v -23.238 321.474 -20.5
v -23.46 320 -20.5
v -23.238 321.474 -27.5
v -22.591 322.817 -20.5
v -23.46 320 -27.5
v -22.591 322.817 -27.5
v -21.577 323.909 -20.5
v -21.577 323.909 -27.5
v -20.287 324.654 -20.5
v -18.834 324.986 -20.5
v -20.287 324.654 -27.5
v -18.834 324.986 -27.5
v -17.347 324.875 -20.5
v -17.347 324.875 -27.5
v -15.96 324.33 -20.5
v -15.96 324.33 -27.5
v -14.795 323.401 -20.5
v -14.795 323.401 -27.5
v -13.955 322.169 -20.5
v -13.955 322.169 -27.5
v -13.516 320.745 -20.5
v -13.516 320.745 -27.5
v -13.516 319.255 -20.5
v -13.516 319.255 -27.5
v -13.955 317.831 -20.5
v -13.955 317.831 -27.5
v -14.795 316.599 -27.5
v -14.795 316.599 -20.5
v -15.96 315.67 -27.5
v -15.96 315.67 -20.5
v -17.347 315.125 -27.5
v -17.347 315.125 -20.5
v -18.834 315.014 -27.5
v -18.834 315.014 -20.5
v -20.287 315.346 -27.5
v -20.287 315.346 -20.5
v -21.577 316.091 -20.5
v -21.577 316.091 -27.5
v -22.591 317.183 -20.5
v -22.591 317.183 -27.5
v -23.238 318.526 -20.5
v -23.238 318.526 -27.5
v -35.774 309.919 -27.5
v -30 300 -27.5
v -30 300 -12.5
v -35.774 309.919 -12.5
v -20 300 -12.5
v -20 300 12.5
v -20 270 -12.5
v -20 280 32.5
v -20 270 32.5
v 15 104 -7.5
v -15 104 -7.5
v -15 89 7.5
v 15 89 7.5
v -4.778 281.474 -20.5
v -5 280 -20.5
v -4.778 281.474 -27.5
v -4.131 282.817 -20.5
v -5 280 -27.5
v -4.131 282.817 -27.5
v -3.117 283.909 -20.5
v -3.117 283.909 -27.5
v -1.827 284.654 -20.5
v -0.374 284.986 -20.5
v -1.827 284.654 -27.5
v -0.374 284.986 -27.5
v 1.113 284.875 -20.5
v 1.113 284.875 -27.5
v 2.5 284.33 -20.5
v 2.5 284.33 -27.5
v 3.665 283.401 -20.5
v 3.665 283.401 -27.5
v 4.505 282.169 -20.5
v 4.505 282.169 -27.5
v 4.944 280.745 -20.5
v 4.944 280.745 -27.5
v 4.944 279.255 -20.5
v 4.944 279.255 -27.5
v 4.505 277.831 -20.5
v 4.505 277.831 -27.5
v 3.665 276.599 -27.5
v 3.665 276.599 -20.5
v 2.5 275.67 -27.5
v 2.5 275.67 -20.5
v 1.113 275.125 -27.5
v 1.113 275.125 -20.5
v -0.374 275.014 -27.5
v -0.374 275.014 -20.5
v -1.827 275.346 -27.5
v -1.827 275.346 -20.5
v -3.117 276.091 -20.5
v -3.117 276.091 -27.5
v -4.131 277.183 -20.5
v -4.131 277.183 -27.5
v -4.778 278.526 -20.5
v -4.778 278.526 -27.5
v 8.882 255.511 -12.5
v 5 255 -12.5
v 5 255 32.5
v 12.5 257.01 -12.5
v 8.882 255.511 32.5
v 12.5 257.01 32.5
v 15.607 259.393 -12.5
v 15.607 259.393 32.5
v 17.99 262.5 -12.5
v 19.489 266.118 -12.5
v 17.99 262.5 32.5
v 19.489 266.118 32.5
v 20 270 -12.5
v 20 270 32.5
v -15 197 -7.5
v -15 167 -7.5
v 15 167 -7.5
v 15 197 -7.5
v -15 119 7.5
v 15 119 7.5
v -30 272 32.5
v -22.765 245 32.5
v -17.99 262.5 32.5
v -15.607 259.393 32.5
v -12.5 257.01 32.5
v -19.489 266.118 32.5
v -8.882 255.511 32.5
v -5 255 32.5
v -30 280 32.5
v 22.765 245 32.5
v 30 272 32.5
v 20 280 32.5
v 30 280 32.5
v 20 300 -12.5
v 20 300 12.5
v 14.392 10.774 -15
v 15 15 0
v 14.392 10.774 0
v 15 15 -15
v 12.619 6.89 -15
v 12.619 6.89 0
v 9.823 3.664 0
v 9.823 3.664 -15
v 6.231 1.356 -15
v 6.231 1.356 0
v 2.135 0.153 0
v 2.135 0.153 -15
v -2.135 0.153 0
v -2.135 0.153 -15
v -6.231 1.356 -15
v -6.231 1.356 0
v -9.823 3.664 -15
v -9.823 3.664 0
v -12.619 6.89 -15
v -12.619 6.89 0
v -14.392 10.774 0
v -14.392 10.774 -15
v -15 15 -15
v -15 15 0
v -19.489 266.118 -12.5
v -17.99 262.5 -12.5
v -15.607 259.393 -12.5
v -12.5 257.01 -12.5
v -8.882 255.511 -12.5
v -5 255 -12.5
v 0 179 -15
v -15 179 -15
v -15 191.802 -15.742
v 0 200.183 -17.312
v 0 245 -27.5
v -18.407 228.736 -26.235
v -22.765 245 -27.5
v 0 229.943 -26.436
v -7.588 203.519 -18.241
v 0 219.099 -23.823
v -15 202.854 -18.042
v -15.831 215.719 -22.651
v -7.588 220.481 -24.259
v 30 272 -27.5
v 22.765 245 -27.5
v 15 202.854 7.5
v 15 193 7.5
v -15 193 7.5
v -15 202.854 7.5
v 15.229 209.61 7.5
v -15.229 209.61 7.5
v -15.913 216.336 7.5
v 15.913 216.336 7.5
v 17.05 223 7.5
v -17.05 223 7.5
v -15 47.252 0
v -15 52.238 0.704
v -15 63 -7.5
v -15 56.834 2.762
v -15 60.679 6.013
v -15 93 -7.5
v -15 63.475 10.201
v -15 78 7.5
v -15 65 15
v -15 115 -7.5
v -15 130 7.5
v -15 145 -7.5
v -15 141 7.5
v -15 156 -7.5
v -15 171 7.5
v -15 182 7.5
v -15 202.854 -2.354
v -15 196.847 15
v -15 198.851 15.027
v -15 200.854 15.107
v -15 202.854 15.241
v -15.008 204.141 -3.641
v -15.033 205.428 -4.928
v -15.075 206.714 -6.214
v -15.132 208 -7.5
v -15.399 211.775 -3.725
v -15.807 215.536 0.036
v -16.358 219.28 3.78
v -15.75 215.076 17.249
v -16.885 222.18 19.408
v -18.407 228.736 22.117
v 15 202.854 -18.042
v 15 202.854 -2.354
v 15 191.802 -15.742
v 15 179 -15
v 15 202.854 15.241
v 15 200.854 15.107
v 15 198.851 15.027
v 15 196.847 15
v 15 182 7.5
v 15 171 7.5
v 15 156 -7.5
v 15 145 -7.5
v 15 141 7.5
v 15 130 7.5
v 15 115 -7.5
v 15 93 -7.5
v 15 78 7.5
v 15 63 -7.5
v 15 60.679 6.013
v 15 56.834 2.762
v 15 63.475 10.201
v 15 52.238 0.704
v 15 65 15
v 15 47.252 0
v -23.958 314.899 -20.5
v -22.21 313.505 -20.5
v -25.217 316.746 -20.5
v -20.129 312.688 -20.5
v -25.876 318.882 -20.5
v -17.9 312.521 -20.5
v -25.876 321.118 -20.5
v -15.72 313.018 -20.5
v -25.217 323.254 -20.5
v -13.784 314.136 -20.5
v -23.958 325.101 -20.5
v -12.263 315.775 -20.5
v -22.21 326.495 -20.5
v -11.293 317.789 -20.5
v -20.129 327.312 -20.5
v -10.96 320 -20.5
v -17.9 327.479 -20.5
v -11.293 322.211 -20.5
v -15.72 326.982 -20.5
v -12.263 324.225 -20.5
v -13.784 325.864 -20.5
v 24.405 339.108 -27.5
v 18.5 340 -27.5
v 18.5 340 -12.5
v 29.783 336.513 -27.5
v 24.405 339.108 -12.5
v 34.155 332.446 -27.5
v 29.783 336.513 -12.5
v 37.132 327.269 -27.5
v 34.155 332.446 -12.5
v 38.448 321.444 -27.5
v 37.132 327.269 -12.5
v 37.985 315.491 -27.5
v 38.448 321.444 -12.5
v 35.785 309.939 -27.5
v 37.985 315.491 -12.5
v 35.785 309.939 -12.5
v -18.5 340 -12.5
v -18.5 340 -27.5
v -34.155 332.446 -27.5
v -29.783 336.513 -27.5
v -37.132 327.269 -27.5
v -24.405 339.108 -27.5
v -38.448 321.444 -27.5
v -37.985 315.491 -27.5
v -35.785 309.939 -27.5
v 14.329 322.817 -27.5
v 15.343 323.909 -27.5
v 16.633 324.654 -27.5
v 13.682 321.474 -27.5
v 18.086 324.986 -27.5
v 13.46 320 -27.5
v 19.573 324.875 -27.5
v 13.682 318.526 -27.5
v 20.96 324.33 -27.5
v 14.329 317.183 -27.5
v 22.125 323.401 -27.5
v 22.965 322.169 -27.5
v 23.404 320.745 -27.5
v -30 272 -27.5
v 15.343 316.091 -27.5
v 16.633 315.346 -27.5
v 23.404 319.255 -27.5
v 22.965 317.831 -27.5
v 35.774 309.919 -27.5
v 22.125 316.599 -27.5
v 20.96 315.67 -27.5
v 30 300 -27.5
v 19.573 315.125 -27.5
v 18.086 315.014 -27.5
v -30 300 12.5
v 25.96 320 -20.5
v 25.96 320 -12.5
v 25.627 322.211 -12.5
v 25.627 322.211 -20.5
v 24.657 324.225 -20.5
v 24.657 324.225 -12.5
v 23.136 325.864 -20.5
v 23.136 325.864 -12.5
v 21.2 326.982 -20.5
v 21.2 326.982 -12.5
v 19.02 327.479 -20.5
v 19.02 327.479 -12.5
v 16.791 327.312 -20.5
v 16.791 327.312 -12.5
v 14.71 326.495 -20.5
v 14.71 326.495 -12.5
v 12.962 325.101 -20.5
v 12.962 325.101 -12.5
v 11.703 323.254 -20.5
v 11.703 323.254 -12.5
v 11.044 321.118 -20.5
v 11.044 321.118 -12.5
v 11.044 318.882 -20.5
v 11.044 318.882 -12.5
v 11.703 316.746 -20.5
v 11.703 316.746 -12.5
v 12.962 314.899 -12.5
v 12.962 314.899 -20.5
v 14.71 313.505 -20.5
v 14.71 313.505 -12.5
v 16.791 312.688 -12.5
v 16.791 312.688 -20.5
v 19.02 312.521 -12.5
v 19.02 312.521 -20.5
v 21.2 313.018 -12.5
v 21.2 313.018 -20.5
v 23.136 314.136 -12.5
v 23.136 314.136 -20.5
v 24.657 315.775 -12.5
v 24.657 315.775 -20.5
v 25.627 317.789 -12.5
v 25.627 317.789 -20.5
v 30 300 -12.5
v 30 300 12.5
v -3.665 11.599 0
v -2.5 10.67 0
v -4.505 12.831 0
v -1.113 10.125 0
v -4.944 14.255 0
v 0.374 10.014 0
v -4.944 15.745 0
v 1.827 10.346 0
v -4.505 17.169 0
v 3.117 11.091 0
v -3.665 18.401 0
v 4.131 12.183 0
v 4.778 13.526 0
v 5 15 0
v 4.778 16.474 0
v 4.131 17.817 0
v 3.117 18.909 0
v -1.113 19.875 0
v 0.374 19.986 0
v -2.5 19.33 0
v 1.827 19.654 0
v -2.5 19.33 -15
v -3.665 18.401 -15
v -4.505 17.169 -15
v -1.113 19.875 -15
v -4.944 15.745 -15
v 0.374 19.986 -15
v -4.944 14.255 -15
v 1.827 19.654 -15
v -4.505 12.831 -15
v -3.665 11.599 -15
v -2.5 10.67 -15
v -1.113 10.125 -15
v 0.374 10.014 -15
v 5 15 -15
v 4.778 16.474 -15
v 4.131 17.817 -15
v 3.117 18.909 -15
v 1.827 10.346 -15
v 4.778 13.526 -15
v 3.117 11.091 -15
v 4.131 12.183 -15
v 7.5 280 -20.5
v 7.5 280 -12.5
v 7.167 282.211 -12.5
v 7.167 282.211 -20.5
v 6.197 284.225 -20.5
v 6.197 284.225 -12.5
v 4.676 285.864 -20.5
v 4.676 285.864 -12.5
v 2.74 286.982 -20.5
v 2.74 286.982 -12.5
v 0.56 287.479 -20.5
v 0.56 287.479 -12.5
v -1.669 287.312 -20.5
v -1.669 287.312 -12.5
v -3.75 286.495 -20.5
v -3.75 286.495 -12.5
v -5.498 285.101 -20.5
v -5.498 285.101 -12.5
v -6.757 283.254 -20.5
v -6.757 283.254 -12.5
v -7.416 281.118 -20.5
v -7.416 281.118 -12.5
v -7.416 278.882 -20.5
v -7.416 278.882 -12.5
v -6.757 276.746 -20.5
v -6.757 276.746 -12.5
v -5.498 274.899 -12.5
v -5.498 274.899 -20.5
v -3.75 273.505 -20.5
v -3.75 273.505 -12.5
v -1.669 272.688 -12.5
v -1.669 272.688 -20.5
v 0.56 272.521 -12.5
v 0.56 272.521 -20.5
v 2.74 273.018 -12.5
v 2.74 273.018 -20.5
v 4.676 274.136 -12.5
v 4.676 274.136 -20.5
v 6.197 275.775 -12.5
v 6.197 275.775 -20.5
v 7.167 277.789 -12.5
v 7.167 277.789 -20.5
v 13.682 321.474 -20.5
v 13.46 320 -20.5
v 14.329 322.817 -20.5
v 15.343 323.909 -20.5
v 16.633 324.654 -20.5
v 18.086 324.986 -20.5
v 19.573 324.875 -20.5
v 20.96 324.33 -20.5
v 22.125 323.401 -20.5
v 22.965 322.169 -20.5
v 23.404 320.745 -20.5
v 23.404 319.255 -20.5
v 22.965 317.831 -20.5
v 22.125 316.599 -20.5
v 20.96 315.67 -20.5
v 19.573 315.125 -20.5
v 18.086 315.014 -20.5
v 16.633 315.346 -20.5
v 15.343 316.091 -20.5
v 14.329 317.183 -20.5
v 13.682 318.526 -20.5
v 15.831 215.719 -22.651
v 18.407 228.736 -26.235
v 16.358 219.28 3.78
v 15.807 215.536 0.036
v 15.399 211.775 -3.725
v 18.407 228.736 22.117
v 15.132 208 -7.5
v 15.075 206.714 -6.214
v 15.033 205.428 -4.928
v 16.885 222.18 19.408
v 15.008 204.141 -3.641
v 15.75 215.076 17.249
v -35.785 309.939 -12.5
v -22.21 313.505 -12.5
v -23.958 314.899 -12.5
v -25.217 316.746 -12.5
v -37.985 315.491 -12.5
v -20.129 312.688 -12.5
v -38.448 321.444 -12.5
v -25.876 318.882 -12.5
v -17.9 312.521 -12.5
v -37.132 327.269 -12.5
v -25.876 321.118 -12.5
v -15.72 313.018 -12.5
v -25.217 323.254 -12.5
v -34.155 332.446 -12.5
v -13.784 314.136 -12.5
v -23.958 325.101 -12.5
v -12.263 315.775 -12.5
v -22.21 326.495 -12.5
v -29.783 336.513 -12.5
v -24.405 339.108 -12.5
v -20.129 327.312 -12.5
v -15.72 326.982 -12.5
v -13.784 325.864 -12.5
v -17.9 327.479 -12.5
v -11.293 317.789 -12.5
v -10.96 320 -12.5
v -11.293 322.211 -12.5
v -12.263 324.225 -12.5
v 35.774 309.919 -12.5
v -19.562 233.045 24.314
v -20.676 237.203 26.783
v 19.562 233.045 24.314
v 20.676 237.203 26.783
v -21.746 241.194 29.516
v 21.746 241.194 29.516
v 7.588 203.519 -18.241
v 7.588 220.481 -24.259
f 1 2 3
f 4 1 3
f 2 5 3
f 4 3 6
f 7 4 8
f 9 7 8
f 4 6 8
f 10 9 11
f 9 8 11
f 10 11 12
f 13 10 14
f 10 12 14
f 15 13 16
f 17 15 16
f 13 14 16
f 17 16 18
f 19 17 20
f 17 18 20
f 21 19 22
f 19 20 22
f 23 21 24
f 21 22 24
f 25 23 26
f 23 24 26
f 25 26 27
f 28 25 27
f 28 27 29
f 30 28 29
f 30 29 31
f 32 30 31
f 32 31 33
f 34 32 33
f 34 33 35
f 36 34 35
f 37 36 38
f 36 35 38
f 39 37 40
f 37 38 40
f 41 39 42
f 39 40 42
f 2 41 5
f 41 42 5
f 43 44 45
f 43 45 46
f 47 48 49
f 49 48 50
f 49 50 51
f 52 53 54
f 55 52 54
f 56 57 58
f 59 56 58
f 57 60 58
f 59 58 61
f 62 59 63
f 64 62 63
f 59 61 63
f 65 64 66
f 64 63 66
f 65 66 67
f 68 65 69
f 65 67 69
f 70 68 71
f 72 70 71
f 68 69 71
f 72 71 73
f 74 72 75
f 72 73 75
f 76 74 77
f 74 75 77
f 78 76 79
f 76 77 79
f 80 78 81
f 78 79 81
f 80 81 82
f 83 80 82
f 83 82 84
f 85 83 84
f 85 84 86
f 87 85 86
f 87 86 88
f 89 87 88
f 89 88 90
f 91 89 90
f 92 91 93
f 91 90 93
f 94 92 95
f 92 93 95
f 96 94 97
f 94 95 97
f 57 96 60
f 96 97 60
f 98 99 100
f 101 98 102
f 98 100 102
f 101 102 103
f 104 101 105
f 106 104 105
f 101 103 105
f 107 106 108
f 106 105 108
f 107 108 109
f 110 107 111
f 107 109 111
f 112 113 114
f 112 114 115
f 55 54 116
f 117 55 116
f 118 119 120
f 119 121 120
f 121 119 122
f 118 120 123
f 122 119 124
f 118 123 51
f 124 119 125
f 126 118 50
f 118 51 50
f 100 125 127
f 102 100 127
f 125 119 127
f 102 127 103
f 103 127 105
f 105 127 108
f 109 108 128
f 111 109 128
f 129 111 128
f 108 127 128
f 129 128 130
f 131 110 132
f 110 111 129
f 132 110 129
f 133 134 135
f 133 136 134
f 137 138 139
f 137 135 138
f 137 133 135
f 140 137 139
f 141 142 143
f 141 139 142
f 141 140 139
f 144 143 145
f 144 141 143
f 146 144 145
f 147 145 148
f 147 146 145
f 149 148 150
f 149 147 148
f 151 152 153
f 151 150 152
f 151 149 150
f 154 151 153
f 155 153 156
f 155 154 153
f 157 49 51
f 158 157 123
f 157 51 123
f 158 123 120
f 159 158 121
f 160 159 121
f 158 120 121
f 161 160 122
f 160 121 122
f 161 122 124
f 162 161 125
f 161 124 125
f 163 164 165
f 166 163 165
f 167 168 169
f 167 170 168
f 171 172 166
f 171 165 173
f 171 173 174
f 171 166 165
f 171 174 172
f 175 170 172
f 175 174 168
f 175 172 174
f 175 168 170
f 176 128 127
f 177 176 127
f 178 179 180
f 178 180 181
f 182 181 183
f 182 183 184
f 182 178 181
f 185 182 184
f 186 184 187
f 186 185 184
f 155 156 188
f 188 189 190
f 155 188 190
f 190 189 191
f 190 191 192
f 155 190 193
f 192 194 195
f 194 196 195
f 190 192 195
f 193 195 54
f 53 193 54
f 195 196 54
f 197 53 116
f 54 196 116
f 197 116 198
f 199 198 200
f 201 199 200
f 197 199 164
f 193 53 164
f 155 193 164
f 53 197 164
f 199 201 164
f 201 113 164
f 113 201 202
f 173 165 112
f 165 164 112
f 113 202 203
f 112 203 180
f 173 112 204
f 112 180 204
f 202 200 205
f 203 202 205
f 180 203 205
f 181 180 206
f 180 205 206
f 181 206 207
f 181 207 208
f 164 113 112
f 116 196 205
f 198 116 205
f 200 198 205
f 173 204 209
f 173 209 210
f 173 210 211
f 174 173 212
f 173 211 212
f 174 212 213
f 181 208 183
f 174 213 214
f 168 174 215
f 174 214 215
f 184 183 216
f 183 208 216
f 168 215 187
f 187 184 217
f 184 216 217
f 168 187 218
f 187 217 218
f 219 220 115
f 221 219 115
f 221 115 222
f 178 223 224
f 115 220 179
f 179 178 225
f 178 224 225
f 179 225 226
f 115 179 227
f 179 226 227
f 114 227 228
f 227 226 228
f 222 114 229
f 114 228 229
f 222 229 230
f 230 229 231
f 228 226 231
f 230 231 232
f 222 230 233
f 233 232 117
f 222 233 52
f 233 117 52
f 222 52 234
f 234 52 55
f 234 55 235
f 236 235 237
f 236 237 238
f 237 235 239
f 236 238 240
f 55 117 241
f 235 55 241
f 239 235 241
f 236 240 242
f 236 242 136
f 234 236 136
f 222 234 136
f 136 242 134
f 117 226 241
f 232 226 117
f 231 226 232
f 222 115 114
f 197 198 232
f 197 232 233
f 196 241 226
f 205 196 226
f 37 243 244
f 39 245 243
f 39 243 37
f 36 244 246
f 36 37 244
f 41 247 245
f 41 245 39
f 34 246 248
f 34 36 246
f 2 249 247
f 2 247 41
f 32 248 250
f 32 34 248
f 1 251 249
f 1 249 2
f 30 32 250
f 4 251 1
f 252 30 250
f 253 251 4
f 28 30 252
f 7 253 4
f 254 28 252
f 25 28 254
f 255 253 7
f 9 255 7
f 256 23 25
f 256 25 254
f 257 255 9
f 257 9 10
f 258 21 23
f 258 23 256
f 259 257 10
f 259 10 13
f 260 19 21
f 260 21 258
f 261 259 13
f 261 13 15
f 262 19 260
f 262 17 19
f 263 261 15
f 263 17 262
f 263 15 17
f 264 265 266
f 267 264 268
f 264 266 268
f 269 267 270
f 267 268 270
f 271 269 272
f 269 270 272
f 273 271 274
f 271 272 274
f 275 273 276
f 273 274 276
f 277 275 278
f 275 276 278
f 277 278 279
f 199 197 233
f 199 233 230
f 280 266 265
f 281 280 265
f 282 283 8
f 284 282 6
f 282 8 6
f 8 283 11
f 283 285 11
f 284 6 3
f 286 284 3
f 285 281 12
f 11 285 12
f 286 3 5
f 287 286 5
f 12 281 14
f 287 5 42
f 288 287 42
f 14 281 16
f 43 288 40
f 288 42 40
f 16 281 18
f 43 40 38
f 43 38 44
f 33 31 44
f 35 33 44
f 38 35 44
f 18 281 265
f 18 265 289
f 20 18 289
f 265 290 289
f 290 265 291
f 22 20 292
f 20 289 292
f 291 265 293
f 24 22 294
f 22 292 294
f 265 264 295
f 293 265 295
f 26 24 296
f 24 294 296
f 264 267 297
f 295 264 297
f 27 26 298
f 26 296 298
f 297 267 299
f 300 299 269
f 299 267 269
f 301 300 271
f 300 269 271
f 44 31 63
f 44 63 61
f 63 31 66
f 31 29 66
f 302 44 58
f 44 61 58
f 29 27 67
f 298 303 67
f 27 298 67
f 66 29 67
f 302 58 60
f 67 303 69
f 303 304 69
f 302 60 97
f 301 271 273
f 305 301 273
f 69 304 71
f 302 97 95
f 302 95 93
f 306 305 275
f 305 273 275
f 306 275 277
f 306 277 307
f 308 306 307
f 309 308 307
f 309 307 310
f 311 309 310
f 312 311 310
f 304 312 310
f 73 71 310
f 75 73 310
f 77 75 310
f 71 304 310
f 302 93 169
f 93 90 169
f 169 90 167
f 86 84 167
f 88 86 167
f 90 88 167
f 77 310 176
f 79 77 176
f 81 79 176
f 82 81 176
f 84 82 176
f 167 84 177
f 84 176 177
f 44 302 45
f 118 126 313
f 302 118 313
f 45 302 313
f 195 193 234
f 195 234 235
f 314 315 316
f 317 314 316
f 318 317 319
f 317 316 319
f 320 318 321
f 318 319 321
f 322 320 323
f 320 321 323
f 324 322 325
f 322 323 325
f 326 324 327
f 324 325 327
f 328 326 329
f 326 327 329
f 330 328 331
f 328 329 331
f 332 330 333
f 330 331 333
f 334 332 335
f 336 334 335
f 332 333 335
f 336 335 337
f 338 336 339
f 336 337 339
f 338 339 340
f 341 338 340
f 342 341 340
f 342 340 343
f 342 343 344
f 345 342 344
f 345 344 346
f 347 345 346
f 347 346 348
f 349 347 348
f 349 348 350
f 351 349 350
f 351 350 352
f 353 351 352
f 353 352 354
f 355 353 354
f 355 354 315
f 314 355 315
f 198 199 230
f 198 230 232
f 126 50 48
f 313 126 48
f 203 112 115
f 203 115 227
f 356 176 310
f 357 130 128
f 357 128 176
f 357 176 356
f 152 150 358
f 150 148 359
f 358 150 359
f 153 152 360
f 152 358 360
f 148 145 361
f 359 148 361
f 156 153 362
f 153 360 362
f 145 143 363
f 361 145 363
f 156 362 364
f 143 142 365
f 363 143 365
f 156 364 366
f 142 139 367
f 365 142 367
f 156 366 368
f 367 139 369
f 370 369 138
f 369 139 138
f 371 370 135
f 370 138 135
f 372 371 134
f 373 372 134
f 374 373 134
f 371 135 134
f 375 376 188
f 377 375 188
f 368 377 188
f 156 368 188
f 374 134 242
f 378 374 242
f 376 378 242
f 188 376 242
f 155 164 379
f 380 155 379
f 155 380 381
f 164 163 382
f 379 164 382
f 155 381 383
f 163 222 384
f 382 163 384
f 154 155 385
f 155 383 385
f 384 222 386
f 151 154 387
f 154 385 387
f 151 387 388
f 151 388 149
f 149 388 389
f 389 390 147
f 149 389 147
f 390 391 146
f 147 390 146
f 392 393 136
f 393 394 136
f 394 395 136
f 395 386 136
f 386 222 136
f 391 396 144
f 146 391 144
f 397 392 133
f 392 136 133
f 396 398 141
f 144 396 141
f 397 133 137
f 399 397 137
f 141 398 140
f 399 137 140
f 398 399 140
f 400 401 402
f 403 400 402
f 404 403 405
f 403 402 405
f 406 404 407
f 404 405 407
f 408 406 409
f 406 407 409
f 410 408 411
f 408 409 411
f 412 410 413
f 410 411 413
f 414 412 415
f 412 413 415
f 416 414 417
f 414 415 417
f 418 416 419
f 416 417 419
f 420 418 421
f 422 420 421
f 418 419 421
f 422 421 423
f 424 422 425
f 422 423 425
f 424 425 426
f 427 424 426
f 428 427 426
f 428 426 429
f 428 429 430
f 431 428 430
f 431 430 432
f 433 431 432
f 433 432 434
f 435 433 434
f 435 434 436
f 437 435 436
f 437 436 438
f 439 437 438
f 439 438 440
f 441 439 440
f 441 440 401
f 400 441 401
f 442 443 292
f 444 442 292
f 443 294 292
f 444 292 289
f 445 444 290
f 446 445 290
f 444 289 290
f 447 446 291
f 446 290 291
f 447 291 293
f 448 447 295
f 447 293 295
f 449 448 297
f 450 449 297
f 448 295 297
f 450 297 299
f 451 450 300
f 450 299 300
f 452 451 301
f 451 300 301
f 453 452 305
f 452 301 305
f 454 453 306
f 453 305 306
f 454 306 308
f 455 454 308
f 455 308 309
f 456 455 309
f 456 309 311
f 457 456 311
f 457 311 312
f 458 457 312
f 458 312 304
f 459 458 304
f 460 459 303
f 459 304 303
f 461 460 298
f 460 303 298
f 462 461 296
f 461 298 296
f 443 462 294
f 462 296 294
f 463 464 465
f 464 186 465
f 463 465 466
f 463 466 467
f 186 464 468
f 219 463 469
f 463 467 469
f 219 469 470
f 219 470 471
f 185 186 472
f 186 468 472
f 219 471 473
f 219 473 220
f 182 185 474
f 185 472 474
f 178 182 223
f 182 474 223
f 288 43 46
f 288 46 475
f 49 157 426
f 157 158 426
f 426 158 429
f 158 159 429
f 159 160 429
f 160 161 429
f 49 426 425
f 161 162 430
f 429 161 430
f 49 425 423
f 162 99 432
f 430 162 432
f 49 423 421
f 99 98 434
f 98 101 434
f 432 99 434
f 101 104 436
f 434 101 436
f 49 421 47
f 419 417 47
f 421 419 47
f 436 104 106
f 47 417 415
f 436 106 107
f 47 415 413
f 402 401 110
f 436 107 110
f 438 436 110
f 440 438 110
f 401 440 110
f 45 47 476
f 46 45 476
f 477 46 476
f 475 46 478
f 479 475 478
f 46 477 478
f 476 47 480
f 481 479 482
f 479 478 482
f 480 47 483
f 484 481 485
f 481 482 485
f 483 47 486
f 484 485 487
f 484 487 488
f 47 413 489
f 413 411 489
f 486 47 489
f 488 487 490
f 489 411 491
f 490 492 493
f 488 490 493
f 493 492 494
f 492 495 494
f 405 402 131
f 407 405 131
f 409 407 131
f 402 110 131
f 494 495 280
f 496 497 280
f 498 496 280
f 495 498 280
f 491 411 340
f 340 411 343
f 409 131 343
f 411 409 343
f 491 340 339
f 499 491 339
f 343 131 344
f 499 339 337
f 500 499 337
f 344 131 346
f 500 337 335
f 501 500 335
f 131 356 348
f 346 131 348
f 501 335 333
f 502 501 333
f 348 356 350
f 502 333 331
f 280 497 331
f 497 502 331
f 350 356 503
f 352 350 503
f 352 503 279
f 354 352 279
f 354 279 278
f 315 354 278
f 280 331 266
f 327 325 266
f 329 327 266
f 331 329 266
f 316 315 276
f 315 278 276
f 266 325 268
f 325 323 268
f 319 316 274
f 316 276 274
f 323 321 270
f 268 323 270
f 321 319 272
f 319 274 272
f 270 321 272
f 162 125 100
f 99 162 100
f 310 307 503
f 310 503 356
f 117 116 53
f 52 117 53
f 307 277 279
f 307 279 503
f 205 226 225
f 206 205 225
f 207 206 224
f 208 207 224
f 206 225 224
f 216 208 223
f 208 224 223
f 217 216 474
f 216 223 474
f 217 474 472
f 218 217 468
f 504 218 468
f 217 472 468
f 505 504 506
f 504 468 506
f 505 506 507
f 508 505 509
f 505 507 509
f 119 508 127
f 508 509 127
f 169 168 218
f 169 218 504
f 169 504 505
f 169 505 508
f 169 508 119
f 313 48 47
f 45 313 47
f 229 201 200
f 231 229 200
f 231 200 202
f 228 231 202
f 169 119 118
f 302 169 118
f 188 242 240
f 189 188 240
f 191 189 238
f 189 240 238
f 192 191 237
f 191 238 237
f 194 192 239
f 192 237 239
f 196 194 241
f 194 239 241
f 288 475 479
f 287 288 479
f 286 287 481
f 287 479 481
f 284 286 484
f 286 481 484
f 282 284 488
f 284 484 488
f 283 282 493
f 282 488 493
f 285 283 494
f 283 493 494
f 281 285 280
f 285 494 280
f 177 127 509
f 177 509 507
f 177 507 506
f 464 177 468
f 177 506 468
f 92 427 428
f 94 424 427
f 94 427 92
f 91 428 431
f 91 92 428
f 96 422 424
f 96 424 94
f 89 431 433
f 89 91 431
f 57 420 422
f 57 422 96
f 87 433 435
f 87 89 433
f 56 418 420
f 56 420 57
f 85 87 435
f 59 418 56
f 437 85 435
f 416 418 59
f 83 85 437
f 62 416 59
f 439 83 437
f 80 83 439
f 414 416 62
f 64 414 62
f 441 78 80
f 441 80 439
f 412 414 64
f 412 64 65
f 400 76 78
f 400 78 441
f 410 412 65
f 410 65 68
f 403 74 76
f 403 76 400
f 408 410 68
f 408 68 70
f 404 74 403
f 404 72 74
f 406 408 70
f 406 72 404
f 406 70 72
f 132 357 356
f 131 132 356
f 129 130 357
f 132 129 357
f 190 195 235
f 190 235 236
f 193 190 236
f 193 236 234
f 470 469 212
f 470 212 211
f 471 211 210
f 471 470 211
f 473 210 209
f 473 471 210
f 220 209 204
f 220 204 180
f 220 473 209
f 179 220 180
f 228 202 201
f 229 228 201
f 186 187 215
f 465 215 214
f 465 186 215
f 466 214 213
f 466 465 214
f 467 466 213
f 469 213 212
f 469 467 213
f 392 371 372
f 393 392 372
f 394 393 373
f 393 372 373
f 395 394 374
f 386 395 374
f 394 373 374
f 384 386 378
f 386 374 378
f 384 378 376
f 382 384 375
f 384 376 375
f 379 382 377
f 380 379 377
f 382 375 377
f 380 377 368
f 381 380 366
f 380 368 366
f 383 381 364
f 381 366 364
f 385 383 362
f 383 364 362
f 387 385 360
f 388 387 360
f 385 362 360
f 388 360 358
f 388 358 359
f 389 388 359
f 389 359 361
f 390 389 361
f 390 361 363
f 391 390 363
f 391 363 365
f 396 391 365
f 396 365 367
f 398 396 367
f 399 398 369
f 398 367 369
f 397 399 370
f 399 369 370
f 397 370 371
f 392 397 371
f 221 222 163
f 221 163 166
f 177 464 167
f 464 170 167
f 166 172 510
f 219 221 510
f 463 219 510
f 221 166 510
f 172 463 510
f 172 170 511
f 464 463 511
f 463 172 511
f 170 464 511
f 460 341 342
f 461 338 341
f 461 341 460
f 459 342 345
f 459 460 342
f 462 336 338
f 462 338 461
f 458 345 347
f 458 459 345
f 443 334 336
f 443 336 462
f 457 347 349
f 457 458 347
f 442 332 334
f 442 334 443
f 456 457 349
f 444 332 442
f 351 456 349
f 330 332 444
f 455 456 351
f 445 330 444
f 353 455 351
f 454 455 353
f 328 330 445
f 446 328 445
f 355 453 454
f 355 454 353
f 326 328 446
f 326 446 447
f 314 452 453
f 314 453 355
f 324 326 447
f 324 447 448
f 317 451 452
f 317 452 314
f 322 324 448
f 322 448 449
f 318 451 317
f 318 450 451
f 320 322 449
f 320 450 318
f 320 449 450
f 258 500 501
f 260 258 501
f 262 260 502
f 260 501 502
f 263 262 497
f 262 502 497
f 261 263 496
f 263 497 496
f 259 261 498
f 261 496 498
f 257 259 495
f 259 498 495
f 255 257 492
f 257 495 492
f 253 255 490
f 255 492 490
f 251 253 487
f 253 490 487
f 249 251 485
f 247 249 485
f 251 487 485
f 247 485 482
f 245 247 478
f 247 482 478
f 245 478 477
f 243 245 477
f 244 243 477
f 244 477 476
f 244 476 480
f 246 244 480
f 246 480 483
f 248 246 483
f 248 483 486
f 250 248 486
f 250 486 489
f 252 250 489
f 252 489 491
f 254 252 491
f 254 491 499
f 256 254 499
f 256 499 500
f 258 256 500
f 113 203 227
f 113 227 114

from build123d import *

# Parameters (mm, degrees)
BOSS_EXTRUDE1_DEPTH                     = 40
CUT_EXTRUDE3_REACH                      = 349.563
SKETCH2_W                               = 10
SKETCH2_H                               = 8
FILLET1_RADIUS                          = 15
FILLET1_LENGTH                          = 15
SKETCH3_R                               = 5
CUT_EXTRUDE4_DEPTH                      = 15
CUT_EXTRUDE5_REACH                      = 349.394
CBORE_FOR_M5_HEX_HEAD_BOLT1_D           = 10
CBORE_FOR_M5_HEX_HEAD_BOLT1_CBORE_D     = 15
CBORE_FOR_M5_HEX_HEAD_BOLT1_CBORE_DEPTH = 8
CUT_EXTRUDE6_DEPTH                      = 40


with BuildPart() as part:
    # Sketch1 → Boss-Extrude1 (new, symmetric)
    with BuildSketch(Plane.YZ):
        with BuildLine():
            Line((0, 0), (47.251760651, 0))
            ThreePointArc((47.251760651, 0), (58.870710689, 4.252272915), (65, 15))
            Line((65, 15), (196.846599289, 15))
            ThreePointArc((196.846599289, 15), (222.463976204, 19.510639101), (245, 32.5))
            Line((245, 32.5), (280, 32.5))
            Line((280, 32.5), (300, 12.5))
            Line((300, 12.5), (300, -12.5))
            Line((300, -12.5), (340, -12.5))
            Line((340, -12.5), (340, -27.5))
            Line((340, -27.5), (245, -27.5))
            add(Edge.make_bspline(
                [(179, -15), (212.333333333, -15), (211.666666667, -27.5), (245, -27.5)],
                knots=[0, 0, 0, 0, 1, 1, 1, 1], degree=3))
            Line((179, -15), (0, -15))
            Line((0, -15), (0, 0))
        make_face()
    extrude(amount=BOSS_EXTRUDE1_DEPTH, both=True)

    # Cut-Extrude3: up to this face of the body (flat: up to its plane)
    cut_extrude3_end = Plane(part.part.faces().sort_by_distance((0, 292.5, -27.5))[0])
    # Sketch2 → Cut-Extrude3 (cut, up to the picked face)
    with BuildSketch(Plane.XY.offset(32.5), mode=Mode.PRIVATE) as cut_extrude3_sk1:
        with BuildLine():
            Line((15, 202.853988128), (15, 0))
            Line((15, 0), (40, 0))
            Line((40, 0), (40, 47.251760651))
            Line((40, 47.251760651), (40, 245))
            Line((40, 245), (22.765371804, 245))
            Line((22.765371804, 245), (18.407417371, 228.735892638))
            ThreePointArc((18.407417371, 228.735892638), (15.855513863, 215.90660735), (15, 202.853988128))
        make_face()
    cut_extrude3_tool1 = split(extrude(cut_extrude3_sk1.sketch, amount=-CUT_EXTRUDE3_REACH, mode=Mode.PRIVATE), bisect_by=cut_extrude3_end, keep=Keep.BOTH, mode=Mode.PRIVATE)
    # Sketch2 → Cut-Extrude3 (cut, up to the picked face)
    with BuildSketch(Plane.XY.offset(32.5), mode=Mode.PRIVATE) as cut_extrude3_sk2:
        with BuildLine():
            Line((-40, 0), (-15, 0))
            Line((-15, 0), (-15, 202.853988128))
            ThreePointArc((-15, 202.853988128), (-15.855513863, 215.90660735), (-18.407417371, 228.735892638))
            Line((-18.407417371, 228.735892638), (-22.765371804, 245))
            Line((-22.765371804, 245), (-40, 245))
            Line((-40, 245), (-40, 0))
        make_face()
    cut_extrude3_tool2 = split(extrude(cut_extrude3_sk2.sketch, amount=-CUT_EXTRUDE3_REACH, mode=Mode.PRIVATE), bisect_by=cut_extrude3_end, keep=Keep.BOTH, mode=Mode.PRIVATE)
    # Sketch2 → Cut-Extrude3 (cut, up to the picked face)
    with BuildSketch(Plane.XY.offset(32.5), mode=Mode.PRIVATE) as cut_extrude3_sk3:
        Polygon((30, 272), (22.765371804, 245), (40, 245), (40, 272), align=None)
    cut_extrude3_tool3 = split(extrude(cut_extrude3_sk3.sketch, amount=-CUT_EXTRUDE3_REACH, mode=Mode.PRIVATE), bisect_by=cut_extrude3_end, keep=Keep.BOTH, mode=Mode.PRIVATE)
    # Sketch2 → Cut-Extrude3 (cut, up to the picked face)
    with BuildSketch(Plane.XY.offset(32.5), mode=Mode.PRIVATE) as cut_extrude3_sk4:
        Polygon((-40, 272), (-40, 245), (-22.765371804, 245), (-30, 272), align=None)
    cut_extrude3_tool4 = split(extrude(cut_extrude3_sk4.sketch, amount=-CUT_EXTRUDE3_REACH, mode=Mode.PRIVATE), bisect_by=cut_extrude3_end, keep=Keep.BOTH, mode=Mode.PRIVATE)
    # Sketch2 → Cut-Extrude3 (cut, up to the picked face)
    with BuildSketch(Plane.XY.offset(32.5), mode=Mode.PRIVATE) as cut_extrude3_sk5:
        with BuildLine():
            Line((30, 300), (30, 280))
            Line((30, 280), (40, 280))
            Line((40, 280), (40, 340))
            Line((40, 340), (18.5, 340))
            ThreePointArc((18.5, 340), (35.838126061, 329.969422485), (35.78511038, 309.938938469))
            Line((35.78511038, 309.938938469), (35.773706219, 309.919345885))
            Line((35.773706219, 309.919345885), (30, 300))
        make_face()
    cut_extrude3_tool5 = split(extrude(cut_extrude3_sk5.sketch, amount=-CUT_EXTRUDE3_REACH, mode=Mode.PRIVATE), bisect_by=cut_extrude3_end, keep=Keep.BOTH, mode=Mode.PRIVATE)
    # Sketch2 → Cut-Extrude3 (cut, up to the picked face)
    with BuildSketch(Plane.XY.offset(32.5), mode=Mode.PRIVATE) as cut_extrude3_sk6:
        with Locations((35, 276)):
            Rectangle(SKETCH2_W, SKETCH2_H)
    cut_extrude3_tool6 = split(extrude(cut_extrude3_sk6.sketch, amount=-CUT_EXTRUDE3_REACH, mode=Mode.PRIVATE), bisect_by=cut_extrude3_end, keep=Keep.BOTH, mode=Mode.PRIVATE)
    # Sketch2 → Cut-Extrude3 (cut, up to the picked face)
    with BuildSketch(Plane.XY.offset(32.5), mode=Mode.PRIVATE) as cut_extrude3_sk7:
        with Locations((-35, 276)):
            Rectangle(SKETCH2_W, SKETCH2_H)
    cut_extrude3_tool7 = split(extrude(cut_extrude3_sk7.sketch, amount=-CUT_EXTRUDE3_REACH, mode=Mode.PRIVATE), bisect_by=cut_extrude3_end, keep=Keep.BOTH, mode=Mode.PRIVATE)
    # Sketch2 → Cut-Extrude3 (cut, up to the picked face)
    with BuildSketch(Plane.XY.offset(32.5), mode=Mode.PRIVATE) as cut_extrude3_sk8:
        with BuildLine():
            Line((-40, 340), (-40, 280))
            Line((-40, 280), (-30, 280))
            Line((-30, 280), (-30, 300))
            Line((-30, 300), (-35.773706219, 309.919345885))
            Line((-35.773706219, 309.919345885), (-35.78511038, 309.938938469))
            ThreePointArc((-35.78511038, 309.938938469), (-35.838126061, 329.969422485), (-18.5, 340))
            Line((-18.5, 340), (-40, 340))
        make_face()
    cut_extrude3_tool8 = split(extrude(cut_extrude3_sk8.sketch, amount=-CUT_EXTRUDE3_REACH, mode=Mode.PRIVATE), bisect_by=cut_extrude3_end, keep=Keep.BOTH, mode=Mode.PRIVATE)
    add(cut_extrude3_tool1.solids().sort_by(Axis((27.70054, 120.268436, 32.5), (0, 0, -1)))[0], mode=Mode.SUBTRACT)
    add(cut_extrude3_tool2.solids().sort_by(Axis((-27.70054, 120.268436, 32.5), (0, 0, -1)))[0], mode=Mode.SUBTRACT)
    add(cut_extrude3_tool3.solids().sort_by(Axis((33.031192, 257.304616, 32.5), (0, 0, -1)))[0], mode=Mode.SUBTRACT)
    add(cut_extrude3_tool4.solids().sort_by(Axis((-33.031192, 257.304616, 32.5), (0, 0, -1)))[0], mode=Mode.SUBTRACT)
    add(cut_extrude3_tool5.solids().sort_by(Axis((35.537859, 306.308968, 32.5), (0, 0, -1)))[0], mode=Mode.SUBTRACT)
    add(cut_extrude3_tool6.solids().sort_by(Axis((35, 276, 32.5), (0, 0, -1)))[0], mode=Mode.SUBTRACT)
    add(cut_extrude3_tool7.solids().sort_by(Axis((-35, 276, 32.5), (0, 0, -1)))[0], mode=Mode.SUBTRACT)
    add(cut_extrude3_tool8.solids().sort_by(Axis((-35.537859, 306.308968, 32.5), (0, 0, -1)))[0], mode=Mode.SUBTRACT)

    # Fillet1: full round fillet: the end face becomes a half cylinder, R = half its width
    fillet1_face = Plane((0, 0, -7.5), x_dir=(0, 0, -1), z_dir=(0, -1, 0))  # on the end face: x along it, z out of the body
    fillet1_slab = fillet1_face.offset(-FILLET1_RADIUS / 2) * Box(FILLET1_LENGTH, 2 * FILLET1_RADIUS, FILLET1_RADIUS, mode=Mode.PRIVATE)  # the body's end, R deep
    fillet1_round = Plane((0, 15, -7.5), x_dir=(0, -1, 0), z_dir=(0, 0, -1)) * Cylinder(FILLET1_RADIUS, FILLET1_LENGTH, mode=Mode.PRIVATE)  # its axis R under the face
    add(fillet1_slab - fillet1_round, mode=Mode.SUBTRACT)

    # Sketch3 → Cut-Extrude4 (cut)
    with BuildSketch(Plane.XY):
        with Locations((0, 15)):
            Circle(SKETCH3_R)
    extrude(amount=-CUT_EXTRUDE4_DEPTH, mode=Mode.SUBTRACT)

    # Cut-Extrude5: up to this face of the body (flat: up to its plane)
    cut_extrude5_end = Plane(part.part.faces().sort_by_distance((0, 319.72582268, -12.5))[0])
    # Sketch4 → Cut-Extrude5 (cut, up to the picked face)
    with BuildSketch(Plane.XY.offset(32.5), mode=Mode.PRIVATE) as cut_extrude5_sk1:
        with BuildLine():
            Line((-20, 300), (-20, 270))
            ThreePointArc((-20, 270), (-15.606601718, 259.393398282), (-5, 255))
            Line((-5, 255), (5, 255))
            ThreePointArc((5, 255), (15.606601718, 259.393398282), (20, 270))
            Line((20, 270), (20, 300))
            Line((20, 300), (-20, 300))
        make_face()
    cut_extrude5_tool1 = split(extrude(cut_extrude5_sk1.sketch, amount=-CUT_EXTRUDE5_REACH, mode=Mode.PRIVATE), bisect_by=cut_extrude5_end, keep=Keep.BOTH, mode=Mode.PRIVATE)
    add(cut_extrude5_tool1.solids().sort_by(Axis((0, 278.585623, 32.5), (0, 0, -1)))[0], mode=Mode.SUBTRACT)

    # CBORE for M5 Hex Head Bolt1 (through all)
    with Locations(Plane.XY.offset(-12.5)):
        with Locations((-18.46, 320), (18.46, 320), (0, 280)):
            CounterBoreHole(CBORE_FOR_M5_HEX_HEAD_BOLT1_D / 2, CBORE_FOR_M5_HEX_HEAD_BOLT1_CBORE_D / 2, CBORE_FOR_M5_HEX_HEAD_BOLT1_CBORE_DEPTH)

    # Sketch8 → Cut-Extrude6 (cut, symmetric)
    with BuildSketch(Plane.YZ.offset(15)):
        Polygon((63, -7.5), (93, -7.5), (78, 7.5), align=None)
        Polygon((89, 7.5), (119, 7.5), (104, -7.5), align=None)
        Polygon((115, -7.5), (145, -7.5), (130, 7.5), align=None)
        Polygon((156, -7.5), (141, 7.5), (171, 7.5), align=None)
        Polygon((167, -7.5), (197, -7.5), (182, 7.5), align=None)
        Polygon((208, -7.5), (193, 7.5), (223, 7.5), align=None)
    extrude(amount=CUT_EXTRUDE6_DEPTH, both=True, mode=Mode.SUBTRACT)


solid = part.part
